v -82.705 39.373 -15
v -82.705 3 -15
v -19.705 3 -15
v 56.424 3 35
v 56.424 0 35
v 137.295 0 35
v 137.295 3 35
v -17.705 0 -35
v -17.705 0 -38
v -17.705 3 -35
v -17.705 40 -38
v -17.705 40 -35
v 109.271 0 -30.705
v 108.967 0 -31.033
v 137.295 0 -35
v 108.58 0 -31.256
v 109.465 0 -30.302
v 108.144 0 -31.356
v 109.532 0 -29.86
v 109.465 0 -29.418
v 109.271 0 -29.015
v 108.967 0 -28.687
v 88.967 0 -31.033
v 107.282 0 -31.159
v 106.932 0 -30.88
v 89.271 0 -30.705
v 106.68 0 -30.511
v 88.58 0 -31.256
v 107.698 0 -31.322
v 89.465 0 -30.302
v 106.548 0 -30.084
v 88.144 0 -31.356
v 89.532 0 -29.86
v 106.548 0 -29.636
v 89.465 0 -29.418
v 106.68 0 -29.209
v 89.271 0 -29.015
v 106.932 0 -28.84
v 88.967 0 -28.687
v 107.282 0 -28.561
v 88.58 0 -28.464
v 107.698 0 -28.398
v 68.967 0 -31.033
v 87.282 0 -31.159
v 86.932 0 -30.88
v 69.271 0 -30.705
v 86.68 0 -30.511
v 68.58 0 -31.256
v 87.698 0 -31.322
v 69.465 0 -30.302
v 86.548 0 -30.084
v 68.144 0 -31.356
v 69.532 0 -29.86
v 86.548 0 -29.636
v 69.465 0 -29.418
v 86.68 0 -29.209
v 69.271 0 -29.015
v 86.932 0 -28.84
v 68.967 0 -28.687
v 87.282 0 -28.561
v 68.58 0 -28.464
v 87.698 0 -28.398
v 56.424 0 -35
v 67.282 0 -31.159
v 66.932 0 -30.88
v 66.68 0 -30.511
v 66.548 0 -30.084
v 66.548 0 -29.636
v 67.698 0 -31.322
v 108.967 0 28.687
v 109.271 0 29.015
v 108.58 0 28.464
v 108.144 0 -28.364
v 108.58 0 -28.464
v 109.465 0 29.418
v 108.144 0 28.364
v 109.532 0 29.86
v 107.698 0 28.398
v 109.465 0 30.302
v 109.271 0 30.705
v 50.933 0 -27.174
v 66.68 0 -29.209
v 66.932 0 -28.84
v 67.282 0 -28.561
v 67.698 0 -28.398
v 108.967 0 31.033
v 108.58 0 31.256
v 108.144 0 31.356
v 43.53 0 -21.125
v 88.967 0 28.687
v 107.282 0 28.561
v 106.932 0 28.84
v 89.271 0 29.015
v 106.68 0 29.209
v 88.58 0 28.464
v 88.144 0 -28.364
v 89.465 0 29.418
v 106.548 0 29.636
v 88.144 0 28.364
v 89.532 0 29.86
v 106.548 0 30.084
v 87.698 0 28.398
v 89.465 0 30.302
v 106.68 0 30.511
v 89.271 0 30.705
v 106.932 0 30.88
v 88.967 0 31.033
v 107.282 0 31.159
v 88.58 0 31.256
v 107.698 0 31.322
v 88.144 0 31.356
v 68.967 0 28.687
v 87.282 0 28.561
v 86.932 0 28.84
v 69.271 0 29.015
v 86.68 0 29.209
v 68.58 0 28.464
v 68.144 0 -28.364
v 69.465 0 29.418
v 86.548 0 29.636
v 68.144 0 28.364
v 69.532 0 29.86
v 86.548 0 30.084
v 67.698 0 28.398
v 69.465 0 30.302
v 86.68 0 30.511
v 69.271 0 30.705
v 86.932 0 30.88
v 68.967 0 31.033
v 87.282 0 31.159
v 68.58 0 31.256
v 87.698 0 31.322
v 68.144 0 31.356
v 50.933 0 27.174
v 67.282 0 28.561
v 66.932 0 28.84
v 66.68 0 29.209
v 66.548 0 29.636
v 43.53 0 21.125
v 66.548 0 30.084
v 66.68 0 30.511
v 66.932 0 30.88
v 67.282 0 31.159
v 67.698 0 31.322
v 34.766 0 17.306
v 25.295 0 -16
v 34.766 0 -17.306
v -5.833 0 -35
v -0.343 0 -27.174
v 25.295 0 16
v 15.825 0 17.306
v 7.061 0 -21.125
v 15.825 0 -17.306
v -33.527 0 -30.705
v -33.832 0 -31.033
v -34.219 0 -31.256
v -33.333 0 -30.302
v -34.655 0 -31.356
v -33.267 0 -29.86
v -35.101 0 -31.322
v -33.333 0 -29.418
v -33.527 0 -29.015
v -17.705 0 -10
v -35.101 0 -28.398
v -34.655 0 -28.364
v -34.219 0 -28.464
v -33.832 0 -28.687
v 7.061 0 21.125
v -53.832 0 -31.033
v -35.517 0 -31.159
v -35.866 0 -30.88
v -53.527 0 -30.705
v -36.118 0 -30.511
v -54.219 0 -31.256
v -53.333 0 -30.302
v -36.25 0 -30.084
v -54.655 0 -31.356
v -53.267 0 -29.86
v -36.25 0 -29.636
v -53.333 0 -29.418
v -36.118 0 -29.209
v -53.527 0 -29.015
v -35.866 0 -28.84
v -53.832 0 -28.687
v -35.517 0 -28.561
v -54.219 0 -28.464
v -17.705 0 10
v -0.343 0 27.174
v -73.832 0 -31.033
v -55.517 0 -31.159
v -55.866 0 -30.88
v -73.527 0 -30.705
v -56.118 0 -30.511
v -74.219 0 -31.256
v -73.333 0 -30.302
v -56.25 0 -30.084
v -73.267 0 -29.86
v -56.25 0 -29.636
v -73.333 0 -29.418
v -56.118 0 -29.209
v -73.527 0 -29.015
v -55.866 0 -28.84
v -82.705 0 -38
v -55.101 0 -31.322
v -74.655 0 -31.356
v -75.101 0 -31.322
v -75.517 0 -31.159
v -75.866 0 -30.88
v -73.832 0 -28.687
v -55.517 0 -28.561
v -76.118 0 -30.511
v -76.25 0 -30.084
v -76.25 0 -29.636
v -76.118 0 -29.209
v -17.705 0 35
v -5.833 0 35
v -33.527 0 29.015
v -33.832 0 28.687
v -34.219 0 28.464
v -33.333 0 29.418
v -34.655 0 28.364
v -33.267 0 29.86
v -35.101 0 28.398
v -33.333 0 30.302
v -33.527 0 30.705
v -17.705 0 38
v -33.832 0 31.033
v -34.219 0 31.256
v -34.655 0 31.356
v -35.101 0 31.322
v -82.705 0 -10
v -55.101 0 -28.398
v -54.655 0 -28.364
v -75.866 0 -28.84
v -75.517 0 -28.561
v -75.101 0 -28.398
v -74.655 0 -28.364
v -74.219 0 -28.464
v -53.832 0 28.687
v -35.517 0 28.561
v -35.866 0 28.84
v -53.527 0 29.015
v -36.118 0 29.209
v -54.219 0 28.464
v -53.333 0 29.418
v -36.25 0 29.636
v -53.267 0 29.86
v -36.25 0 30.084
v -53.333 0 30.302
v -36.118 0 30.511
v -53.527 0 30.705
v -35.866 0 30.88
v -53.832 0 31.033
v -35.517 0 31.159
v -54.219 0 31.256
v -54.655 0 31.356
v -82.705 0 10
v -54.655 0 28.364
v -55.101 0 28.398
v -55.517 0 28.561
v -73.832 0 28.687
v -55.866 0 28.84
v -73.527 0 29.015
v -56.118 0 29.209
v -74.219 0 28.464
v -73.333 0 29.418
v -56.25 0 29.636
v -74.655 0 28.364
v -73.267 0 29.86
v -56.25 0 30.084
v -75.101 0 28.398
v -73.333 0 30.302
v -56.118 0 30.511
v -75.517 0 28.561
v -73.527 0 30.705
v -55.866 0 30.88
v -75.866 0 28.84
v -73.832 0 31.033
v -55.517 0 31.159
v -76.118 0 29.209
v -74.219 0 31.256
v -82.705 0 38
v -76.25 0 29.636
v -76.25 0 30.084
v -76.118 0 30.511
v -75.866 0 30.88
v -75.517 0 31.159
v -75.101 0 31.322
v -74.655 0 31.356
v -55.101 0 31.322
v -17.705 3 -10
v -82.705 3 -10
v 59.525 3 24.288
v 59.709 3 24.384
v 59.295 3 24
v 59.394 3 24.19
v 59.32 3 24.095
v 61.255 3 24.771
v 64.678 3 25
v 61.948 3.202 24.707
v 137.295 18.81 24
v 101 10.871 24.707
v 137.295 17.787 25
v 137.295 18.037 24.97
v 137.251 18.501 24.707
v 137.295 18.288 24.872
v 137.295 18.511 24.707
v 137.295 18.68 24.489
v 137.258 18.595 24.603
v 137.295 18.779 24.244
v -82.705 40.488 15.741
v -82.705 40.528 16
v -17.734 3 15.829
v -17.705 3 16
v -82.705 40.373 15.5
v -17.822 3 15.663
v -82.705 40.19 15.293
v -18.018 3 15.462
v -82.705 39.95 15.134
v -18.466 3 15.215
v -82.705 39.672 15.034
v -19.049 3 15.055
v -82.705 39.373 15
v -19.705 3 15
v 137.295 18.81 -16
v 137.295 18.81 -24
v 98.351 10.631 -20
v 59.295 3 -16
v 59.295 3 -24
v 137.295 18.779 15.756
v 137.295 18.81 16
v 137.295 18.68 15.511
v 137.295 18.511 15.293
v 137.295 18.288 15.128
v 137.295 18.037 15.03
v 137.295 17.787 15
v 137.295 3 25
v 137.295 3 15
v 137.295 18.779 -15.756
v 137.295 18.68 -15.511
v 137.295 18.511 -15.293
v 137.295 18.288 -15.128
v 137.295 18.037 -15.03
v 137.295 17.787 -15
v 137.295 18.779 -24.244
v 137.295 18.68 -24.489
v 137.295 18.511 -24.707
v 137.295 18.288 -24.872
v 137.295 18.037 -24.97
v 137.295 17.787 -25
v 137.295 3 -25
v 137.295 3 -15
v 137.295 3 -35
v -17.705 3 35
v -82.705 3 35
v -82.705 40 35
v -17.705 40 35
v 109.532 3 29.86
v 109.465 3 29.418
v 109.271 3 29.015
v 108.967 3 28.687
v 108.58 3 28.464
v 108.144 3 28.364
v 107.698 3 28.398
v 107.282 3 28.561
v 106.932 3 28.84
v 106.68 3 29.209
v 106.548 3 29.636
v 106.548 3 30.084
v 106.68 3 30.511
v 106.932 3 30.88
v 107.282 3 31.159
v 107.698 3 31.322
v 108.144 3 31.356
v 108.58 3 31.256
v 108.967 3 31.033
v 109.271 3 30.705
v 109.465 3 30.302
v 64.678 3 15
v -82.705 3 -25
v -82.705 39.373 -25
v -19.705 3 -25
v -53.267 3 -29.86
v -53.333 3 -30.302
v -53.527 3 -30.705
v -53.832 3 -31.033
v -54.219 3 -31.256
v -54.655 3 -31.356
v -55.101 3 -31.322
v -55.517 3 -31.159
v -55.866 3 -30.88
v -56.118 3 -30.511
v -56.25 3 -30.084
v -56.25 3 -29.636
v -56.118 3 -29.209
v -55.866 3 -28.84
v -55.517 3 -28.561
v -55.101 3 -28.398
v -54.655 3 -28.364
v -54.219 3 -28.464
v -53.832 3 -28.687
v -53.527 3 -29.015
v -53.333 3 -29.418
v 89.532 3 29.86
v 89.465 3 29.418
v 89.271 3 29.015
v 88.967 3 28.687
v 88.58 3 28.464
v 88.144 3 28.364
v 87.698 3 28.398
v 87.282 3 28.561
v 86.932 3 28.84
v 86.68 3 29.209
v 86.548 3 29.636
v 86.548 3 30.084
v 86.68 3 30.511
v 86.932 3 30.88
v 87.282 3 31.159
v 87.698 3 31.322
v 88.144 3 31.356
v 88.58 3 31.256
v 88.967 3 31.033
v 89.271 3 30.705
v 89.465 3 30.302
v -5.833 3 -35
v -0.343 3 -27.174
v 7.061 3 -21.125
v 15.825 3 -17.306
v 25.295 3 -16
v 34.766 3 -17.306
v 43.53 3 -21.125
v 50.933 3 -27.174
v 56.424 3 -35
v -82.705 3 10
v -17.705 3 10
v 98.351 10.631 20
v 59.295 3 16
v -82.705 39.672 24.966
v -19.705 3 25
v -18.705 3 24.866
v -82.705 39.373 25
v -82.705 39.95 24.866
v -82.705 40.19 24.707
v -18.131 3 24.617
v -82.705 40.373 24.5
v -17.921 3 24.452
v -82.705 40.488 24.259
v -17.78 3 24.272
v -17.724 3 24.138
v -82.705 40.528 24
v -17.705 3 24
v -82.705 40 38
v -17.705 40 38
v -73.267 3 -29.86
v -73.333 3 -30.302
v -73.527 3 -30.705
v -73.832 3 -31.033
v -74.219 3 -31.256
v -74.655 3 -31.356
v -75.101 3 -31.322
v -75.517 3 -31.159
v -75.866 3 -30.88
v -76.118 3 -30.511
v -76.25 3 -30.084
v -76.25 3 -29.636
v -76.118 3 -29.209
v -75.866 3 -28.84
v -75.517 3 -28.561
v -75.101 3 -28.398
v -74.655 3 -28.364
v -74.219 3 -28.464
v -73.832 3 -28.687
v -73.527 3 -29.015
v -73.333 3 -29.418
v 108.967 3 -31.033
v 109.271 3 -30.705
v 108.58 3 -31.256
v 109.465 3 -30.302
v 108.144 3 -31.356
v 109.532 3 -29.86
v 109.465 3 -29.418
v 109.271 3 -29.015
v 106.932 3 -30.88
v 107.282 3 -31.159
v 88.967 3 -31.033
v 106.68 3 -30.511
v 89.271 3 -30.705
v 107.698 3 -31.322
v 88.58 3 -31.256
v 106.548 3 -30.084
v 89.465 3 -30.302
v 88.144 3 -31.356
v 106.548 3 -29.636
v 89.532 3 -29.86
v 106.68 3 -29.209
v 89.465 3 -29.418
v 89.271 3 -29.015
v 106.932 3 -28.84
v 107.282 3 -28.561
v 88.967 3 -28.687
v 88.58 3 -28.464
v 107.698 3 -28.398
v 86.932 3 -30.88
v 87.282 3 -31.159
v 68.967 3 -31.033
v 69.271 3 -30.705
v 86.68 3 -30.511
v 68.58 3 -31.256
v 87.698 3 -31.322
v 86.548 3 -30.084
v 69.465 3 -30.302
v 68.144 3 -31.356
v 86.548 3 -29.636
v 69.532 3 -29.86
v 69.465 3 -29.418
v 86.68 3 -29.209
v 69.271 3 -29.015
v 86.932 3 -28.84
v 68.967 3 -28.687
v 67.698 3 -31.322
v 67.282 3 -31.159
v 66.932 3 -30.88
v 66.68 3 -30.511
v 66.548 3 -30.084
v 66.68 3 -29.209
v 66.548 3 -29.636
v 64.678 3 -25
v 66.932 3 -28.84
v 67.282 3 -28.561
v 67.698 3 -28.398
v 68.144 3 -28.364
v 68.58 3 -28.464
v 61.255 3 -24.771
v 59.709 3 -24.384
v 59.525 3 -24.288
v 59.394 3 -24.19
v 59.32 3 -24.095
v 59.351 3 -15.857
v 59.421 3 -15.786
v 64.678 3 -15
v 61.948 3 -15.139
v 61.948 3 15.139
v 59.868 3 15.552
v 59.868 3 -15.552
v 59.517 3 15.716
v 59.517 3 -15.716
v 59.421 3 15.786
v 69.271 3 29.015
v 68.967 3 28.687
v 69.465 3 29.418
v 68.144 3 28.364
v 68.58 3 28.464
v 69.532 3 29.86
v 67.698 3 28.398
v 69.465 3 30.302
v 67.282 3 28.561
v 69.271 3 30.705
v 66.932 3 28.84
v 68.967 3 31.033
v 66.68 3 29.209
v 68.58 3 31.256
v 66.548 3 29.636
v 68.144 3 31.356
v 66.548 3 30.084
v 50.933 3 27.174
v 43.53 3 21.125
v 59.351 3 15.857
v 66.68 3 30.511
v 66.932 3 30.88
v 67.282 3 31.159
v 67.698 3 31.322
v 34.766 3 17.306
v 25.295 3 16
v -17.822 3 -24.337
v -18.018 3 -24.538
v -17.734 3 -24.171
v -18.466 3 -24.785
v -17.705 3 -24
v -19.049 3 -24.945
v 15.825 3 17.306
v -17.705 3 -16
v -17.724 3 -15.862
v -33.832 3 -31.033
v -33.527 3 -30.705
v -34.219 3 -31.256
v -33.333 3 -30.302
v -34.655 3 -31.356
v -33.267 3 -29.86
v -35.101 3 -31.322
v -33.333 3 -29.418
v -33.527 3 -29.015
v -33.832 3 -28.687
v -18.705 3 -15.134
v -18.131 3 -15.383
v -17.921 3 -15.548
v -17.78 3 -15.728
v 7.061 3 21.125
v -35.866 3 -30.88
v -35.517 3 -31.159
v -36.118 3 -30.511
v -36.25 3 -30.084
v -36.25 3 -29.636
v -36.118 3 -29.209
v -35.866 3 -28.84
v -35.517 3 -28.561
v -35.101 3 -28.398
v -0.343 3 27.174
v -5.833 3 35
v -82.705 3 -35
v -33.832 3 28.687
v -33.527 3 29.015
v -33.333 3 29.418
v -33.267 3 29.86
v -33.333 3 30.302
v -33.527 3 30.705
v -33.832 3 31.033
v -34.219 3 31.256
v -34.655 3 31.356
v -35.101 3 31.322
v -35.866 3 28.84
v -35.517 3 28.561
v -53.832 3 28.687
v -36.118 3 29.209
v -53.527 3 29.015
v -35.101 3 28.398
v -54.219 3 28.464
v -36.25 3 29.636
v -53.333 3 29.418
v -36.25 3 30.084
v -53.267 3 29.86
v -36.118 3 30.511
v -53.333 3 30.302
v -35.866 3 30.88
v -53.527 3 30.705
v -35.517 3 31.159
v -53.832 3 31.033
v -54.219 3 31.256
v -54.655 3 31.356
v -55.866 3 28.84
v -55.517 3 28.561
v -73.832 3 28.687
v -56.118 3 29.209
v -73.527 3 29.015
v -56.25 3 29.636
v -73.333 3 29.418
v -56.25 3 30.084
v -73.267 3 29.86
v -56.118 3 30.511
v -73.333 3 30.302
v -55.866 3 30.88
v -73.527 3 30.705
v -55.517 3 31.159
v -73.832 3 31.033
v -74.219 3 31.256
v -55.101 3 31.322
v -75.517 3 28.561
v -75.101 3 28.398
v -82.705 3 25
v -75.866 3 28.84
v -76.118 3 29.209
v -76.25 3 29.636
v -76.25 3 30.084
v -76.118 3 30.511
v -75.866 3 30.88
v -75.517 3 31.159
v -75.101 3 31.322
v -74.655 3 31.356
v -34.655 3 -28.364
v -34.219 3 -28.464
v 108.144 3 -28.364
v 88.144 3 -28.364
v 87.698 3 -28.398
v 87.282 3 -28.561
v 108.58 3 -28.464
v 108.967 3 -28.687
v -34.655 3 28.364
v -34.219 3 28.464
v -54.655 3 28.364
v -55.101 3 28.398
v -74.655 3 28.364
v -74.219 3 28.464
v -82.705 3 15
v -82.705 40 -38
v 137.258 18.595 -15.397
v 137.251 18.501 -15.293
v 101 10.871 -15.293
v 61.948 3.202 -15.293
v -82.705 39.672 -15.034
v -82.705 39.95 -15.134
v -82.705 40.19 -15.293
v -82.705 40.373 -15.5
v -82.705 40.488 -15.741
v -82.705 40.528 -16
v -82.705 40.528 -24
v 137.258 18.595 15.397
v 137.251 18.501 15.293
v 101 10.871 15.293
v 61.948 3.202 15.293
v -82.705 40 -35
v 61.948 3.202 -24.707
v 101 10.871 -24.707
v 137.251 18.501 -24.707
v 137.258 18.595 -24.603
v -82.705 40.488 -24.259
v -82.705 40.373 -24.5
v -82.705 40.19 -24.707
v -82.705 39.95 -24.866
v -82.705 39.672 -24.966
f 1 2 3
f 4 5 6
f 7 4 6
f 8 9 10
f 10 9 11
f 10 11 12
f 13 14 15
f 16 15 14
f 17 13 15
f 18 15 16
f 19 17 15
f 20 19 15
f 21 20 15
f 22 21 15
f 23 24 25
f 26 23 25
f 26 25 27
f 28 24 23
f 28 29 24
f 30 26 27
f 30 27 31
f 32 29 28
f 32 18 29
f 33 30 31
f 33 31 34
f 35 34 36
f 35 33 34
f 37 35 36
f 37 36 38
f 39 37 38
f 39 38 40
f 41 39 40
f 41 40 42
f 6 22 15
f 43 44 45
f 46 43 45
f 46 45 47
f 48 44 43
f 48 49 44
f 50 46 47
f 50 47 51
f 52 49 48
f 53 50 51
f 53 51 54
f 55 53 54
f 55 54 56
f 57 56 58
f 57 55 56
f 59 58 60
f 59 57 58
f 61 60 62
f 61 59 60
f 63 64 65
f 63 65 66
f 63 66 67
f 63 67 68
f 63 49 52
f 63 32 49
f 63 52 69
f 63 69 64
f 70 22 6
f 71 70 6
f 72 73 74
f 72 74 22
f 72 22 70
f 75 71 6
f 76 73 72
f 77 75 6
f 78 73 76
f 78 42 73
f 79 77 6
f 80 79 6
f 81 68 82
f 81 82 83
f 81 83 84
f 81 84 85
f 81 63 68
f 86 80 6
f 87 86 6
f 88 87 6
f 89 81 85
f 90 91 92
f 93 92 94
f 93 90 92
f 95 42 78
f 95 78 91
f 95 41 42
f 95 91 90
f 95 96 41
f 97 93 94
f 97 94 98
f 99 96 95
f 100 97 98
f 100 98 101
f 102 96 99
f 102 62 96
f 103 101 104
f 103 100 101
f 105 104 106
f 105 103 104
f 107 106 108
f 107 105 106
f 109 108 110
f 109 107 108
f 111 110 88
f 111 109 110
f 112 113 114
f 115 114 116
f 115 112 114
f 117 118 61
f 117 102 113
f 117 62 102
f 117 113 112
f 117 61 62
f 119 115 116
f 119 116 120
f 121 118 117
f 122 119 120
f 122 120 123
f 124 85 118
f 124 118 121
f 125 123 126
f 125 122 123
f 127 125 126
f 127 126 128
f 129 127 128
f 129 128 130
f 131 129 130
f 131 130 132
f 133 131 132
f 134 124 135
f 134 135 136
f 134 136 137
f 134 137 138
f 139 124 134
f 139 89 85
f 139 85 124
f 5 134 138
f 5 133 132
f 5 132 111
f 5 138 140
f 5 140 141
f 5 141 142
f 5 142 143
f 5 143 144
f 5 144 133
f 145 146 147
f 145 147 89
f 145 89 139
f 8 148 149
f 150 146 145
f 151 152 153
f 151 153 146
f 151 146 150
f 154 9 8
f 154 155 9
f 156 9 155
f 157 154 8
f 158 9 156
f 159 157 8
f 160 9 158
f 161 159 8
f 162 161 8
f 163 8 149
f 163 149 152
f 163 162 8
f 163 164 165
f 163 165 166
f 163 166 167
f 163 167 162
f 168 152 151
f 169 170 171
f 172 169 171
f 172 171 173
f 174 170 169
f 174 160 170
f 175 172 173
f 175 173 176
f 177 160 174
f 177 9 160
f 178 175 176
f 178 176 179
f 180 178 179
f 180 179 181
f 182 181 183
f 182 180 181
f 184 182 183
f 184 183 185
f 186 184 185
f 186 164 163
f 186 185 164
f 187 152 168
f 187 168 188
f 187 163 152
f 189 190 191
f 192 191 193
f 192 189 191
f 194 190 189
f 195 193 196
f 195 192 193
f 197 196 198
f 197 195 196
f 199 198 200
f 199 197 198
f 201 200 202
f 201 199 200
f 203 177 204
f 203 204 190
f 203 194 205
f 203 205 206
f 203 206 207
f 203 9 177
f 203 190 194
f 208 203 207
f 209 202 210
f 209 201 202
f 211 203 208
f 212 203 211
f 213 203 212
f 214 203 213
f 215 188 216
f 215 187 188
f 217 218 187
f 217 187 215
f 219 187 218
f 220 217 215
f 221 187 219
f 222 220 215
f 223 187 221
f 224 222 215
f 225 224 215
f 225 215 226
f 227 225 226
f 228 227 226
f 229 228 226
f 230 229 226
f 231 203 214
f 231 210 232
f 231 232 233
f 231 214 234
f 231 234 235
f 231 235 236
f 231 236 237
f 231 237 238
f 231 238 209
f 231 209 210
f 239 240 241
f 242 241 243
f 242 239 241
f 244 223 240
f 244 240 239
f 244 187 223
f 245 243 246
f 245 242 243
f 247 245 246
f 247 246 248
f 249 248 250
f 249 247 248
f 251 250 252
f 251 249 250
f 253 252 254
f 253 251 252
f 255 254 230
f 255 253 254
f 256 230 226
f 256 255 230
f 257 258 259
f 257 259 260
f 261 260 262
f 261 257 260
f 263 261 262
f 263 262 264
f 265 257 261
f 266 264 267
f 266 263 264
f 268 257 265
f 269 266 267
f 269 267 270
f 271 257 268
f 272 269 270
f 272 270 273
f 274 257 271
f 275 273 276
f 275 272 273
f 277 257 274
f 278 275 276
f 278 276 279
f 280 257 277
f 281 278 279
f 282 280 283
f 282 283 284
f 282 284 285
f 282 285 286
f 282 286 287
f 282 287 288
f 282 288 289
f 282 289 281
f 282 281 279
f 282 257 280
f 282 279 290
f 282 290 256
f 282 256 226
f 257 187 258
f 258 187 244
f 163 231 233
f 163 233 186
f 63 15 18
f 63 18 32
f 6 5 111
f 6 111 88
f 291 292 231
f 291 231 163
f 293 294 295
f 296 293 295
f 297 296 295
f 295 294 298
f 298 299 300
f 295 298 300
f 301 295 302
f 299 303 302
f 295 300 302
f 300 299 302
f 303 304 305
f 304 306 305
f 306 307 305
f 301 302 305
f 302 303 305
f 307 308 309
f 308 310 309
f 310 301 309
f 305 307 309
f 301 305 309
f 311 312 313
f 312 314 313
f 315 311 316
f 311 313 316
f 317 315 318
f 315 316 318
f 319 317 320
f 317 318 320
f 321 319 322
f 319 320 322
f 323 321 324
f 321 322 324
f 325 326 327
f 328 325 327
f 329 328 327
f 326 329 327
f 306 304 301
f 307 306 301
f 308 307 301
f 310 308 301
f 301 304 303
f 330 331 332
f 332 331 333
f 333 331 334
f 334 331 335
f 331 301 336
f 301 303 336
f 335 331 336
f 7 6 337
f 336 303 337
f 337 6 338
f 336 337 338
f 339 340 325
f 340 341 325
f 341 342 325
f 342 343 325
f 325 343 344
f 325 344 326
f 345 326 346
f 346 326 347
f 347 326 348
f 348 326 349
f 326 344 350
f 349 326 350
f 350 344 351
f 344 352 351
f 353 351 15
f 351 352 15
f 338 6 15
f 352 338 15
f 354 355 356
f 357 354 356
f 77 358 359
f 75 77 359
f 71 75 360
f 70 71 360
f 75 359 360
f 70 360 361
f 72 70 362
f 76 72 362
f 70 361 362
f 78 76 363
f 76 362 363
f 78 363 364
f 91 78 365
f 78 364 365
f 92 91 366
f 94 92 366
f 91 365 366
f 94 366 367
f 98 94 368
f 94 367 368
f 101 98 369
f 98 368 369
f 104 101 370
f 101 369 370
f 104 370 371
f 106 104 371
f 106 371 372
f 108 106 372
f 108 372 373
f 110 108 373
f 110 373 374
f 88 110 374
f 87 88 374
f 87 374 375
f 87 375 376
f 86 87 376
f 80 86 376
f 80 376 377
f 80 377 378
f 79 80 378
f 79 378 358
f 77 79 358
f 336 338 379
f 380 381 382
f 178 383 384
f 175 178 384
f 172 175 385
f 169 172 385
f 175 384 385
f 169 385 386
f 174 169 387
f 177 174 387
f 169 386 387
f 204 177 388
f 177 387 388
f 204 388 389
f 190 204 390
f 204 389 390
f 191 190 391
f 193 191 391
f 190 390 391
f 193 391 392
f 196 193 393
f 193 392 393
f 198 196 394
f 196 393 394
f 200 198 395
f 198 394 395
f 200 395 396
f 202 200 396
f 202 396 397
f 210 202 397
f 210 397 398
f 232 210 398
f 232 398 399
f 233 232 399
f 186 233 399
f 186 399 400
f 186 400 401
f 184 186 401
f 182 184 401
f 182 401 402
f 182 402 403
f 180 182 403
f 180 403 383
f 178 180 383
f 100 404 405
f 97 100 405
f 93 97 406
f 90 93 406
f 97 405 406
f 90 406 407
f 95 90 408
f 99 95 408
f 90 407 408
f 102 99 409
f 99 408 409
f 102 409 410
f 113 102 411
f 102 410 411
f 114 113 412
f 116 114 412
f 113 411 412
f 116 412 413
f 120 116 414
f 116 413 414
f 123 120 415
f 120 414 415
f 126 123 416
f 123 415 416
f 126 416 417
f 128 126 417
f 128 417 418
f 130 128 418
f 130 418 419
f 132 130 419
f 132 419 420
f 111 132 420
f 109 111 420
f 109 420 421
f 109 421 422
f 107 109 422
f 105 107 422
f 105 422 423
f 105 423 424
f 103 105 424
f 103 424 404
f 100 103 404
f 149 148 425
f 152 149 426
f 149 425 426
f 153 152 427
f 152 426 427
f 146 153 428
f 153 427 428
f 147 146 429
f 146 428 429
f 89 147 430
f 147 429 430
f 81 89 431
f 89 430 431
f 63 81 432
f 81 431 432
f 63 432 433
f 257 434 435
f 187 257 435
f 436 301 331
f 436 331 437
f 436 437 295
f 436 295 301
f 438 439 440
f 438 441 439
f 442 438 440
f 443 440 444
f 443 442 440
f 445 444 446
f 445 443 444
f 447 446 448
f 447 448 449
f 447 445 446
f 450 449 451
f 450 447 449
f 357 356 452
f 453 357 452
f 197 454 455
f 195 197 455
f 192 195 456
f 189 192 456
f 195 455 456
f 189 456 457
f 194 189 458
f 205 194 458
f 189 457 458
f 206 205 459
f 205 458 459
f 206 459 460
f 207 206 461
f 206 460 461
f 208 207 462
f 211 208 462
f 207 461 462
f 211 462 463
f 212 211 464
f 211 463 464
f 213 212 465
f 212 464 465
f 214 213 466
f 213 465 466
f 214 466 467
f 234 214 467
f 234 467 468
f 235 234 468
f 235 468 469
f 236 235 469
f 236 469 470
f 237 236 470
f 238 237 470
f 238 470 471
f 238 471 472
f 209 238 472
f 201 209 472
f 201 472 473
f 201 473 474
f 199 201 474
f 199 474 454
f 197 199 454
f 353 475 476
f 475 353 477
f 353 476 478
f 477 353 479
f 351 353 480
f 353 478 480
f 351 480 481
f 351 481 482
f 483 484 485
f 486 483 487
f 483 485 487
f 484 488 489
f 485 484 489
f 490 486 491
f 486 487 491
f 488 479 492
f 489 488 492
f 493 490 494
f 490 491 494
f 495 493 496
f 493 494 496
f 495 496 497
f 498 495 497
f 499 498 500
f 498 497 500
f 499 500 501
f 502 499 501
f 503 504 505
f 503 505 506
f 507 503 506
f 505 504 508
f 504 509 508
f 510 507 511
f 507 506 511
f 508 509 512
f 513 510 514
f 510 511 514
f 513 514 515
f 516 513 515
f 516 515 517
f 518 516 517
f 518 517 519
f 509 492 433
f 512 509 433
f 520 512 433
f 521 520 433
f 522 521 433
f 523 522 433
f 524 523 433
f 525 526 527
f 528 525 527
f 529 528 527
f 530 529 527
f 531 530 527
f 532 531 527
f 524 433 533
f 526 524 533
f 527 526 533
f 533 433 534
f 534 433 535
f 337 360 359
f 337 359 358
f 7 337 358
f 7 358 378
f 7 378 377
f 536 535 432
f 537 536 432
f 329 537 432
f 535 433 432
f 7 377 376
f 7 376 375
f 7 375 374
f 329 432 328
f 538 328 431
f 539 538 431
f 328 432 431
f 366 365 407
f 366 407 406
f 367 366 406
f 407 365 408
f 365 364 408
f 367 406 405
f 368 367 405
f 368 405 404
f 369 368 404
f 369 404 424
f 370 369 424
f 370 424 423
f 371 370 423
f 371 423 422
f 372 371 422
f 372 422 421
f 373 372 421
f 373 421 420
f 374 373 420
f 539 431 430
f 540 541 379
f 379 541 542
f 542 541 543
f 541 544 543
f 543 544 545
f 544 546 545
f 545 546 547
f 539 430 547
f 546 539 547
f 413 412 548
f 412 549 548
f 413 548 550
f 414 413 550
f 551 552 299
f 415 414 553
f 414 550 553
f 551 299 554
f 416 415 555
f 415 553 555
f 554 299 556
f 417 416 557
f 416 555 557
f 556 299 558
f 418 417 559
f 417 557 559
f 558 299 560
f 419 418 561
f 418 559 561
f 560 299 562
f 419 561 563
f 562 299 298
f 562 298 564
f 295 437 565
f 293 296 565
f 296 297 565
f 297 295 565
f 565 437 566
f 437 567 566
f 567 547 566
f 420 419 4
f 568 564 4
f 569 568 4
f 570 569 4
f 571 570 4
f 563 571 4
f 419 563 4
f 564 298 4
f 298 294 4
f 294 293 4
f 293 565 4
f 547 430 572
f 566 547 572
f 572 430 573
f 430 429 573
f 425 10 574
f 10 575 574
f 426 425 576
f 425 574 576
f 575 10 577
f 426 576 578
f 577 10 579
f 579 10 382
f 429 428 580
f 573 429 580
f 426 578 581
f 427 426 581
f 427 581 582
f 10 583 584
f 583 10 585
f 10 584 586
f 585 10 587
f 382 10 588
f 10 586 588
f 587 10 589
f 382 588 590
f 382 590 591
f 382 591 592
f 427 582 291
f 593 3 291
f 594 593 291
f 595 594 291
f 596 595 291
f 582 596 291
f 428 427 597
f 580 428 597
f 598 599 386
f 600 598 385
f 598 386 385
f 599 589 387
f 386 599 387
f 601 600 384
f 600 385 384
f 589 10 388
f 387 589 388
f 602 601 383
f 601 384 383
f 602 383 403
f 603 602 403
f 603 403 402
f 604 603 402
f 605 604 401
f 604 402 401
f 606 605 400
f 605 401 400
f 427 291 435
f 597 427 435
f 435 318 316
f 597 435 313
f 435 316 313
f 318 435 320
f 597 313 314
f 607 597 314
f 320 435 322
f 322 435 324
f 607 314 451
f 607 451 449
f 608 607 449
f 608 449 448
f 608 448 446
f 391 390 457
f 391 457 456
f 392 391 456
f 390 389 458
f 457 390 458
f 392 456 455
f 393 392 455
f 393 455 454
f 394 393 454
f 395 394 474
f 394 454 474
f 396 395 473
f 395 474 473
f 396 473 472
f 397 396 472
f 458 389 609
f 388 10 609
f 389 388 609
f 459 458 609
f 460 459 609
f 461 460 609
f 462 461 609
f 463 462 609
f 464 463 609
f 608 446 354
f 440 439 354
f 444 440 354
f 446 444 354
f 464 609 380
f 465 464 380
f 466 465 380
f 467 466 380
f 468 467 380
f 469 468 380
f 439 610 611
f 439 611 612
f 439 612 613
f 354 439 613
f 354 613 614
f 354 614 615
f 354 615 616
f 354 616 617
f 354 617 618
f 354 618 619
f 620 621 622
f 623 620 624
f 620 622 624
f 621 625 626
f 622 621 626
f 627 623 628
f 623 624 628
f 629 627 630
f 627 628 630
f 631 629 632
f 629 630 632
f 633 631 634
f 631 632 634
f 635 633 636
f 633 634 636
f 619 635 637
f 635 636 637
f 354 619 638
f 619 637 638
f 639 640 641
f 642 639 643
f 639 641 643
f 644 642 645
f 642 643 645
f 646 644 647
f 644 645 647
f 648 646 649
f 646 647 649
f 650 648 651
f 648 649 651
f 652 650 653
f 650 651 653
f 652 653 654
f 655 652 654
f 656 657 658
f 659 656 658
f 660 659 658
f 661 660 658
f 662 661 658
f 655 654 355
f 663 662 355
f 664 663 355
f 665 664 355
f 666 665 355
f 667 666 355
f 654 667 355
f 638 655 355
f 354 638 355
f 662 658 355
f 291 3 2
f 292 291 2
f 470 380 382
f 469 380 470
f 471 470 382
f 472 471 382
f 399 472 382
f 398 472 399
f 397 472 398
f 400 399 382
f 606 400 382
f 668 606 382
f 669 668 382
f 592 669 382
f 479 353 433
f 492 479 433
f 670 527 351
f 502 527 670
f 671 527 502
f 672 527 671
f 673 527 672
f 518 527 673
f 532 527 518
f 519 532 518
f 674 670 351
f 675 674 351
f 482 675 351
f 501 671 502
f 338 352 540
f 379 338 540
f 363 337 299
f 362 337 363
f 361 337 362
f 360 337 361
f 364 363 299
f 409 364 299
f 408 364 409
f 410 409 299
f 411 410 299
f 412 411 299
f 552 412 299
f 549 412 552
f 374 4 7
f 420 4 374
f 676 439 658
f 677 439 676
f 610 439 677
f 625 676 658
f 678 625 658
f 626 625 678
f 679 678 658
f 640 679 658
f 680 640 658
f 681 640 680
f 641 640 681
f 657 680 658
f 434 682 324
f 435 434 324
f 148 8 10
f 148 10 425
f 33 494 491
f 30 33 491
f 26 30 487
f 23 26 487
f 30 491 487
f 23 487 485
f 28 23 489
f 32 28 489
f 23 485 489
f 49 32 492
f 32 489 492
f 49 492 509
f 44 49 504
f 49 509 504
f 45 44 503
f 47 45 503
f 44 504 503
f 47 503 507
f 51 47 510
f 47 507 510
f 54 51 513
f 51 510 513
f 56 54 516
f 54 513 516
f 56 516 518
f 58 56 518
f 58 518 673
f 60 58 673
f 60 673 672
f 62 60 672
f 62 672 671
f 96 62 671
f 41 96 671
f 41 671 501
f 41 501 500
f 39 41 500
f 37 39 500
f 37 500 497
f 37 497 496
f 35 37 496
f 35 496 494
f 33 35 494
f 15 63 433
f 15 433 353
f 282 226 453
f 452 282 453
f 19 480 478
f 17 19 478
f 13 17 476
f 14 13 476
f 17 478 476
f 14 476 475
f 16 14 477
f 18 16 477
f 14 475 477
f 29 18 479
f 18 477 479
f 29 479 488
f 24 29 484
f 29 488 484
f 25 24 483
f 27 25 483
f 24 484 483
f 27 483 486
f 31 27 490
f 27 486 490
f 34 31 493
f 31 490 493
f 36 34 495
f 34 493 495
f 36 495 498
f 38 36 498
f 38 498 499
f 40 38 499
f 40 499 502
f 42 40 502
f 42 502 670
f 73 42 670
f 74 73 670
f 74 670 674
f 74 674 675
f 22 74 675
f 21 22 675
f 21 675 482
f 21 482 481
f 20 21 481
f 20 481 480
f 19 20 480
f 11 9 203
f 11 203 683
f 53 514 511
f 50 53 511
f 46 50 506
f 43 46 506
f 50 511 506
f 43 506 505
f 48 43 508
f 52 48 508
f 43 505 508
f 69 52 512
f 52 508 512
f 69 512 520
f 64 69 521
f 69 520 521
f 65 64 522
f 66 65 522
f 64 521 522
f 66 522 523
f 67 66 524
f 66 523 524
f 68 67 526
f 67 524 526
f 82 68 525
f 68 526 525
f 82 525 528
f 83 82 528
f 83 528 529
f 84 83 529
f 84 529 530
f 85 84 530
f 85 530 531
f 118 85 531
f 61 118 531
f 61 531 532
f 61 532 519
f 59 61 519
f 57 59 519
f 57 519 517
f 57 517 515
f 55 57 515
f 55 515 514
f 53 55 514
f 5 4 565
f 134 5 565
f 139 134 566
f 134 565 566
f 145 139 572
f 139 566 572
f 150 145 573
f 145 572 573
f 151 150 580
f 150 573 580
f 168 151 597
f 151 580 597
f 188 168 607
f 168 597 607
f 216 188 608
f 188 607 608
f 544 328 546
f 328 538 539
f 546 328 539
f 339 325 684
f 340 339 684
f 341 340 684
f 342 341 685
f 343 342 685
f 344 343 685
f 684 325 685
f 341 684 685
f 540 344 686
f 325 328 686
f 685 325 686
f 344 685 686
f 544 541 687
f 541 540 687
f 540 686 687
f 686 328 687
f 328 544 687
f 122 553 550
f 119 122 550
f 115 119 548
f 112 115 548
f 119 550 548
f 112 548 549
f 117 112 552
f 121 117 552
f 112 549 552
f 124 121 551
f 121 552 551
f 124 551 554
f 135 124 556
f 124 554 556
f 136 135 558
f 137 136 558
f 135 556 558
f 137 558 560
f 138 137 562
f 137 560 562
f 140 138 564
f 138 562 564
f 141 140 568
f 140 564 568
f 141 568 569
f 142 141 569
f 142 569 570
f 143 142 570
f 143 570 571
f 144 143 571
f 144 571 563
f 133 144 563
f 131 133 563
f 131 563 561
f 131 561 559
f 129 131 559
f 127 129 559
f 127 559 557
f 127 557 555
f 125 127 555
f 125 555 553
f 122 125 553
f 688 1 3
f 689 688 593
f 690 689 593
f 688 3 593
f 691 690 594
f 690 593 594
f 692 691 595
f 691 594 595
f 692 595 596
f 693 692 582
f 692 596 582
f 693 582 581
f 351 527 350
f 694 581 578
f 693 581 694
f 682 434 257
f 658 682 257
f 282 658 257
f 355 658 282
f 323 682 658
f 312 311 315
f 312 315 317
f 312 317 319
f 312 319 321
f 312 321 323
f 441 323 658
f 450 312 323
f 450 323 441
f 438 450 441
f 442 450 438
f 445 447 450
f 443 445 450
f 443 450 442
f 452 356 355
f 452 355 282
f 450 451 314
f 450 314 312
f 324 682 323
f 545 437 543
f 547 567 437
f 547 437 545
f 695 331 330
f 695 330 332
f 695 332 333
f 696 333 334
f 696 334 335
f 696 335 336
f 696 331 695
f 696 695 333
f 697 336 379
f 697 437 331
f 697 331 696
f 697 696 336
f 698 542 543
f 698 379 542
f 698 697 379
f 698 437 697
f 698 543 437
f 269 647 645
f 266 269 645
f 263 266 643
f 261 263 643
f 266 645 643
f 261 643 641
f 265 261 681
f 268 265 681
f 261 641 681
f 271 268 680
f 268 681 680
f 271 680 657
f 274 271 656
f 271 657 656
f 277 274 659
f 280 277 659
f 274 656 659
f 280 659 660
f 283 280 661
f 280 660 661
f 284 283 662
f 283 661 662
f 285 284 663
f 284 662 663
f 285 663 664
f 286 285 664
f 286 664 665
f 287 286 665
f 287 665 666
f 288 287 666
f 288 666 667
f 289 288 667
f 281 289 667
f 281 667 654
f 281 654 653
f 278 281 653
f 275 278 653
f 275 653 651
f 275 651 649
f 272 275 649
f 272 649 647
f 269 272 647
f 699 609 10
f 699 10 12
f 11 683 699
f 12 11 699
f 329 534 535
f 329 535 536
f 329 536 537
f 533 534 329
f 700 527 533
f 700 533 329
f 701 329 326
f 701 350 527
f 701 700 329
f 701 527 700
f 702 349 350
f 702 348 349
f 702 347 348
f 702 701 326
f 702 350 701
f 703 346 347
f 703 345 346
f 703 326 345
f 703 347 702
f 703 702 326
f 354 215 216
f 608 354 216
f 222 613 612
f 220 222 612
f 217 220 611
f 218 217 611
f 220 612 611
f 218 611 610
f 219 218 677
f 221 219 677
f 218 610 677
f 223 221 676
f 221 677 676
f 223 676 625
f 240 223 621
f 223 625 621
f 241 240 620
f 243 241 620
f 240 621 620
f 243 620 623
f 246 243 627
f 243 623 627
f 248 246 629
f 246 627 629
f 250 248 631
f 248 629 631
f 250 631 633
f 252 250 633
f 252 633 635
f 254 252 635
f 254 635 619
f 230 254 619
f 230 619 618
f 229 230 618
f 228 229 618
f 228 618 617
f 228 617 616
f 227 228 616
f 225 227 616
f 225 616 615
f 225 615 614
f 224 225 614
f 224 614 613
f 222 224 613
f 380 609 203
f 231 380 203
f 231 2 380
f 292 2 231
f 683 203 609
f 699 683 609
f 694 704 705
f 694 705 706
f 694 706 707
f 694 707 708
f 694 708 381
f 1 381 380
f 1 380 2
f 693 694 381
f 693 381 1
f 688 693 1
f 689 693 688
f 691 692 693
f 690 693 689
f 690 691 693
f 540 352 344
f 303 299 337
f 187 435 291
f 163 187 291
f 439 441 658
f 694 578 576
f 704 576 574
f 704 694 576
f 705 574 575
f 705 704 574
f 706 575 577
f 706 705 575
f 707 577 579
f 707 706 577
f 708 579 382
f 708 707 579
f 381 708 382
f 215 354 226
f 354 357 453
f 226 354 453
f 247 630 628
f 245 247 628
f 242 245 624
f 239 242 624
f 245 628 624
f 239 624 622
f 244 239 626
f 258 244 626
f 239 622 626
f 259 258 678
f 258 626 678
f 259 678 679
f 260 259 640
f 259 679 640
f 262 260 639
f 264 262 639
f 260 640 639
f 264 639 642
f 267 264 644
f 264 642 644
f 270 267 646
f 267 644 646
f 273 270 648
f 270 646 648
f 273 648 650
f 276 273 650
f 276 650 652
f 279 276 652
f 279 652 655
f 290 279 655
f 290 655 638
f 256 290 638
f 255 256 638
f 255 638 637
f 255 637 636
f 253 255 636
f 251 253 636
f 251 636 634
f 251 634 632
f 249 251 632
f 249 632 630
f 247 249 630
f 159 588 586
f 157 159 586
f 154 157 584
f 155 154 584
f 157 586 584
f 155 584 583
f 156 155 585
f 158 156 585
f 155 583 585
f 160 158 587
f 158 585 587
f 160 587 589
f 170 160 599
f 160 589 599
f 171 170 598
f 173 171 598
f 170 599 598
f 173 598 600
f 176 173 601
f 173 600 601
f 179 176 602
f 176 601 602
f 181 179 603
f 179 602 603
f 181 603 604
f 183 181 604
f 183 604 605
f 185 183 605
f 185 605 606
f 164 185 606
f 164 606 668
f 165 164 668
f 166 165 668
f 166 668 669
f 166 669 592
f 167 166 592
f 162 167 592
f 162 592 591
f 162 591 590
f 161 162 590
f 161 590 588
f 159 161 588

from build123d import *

# Parameters (mm, degrees)
SKETCH_1_W           = 220
SKETCH_1_H           = 70
EXTRUDE_1_DEPTH      = 3
EXTRUDE_2_DEPTH      = 25
EXTRUDE_2_DEPTH_BACK = 25
SKETCH_6_W           = 30
SKETCH_6_H           = 37.527767497
CUT_EXTRUDE_4_DEPTH  = 221.0000001
SKETCH_7_R           = 35
CUT_EXTRUDE_5_DEPTH  = 4
SKETCH_8_W           = 3
SKETCH_8_H           = 40
EXTRUDE_3_DEPTH      = 65
SKETCH_9_R           = 1.5
CUT_EXTRUDE_6_DEPTH  = 4
FILLET_5_R           = 1
SKETCH_10_W          = 65
SKETCH_10_H          = 20
CUT_EXTRUDE_7_DEPTH  = 4.0000001


with BuildPart() as part:
    # 草图1 → 凸台-拉伸1 (new body)
    with BuildSketch(Plane(origin=(0, 0, 0), x_dir=(1, 0, 0), z_dir=(0, 1, 0))):
        with Locations((27.295373665, 0)):
            Rectangle(SKETCH_1_W, SKETCH_1_H)
    extrude(amount=EXTRUDE_1_DEPTH)

    # 草图2 → 凸台-拉伸2 (add, two sides)
    with BuildSketch(Plane.XY) as extrude_2_sk:
        Polygon((-82.704626335, 40.527767497), (-82.704626335, 3), (-17.704626335, 3), align=None)
        with BuildLine():
            Line((137.295373665, 3), (137.295373665, 18.810437945))
            add(Edge.make_bspline(
                [(59.295373665, 3), (98.406140267, 10.357107668), (137.295373665, 18.810437945)],
                knots=[0, 0, 0, 1, 1, 1], degree=2))
            Line((59.295373665, 3), (137.295373665, 3))
        make_face()
    extrude(amount=EXTRUDE_2_DEPTH)
    extrude(extrude_2_sk.sketch, amount=-EXTRUDE_2_DEPTH_BACK)

    # 草图6 → 切除-拉伸4 (cut, through all)
    with BuildSketch(Plane.ZY.offset(82.704626335)):
        with Locations((0, 21.763883748)):
            Rectangle(SKETCH_6_W, SKETCH_6_H)
    extrude(amount=-CUT_EXTRUDE_4_DEPTH, mode=Mode.SUBTRACT)

    # 草图7 → 切除-拉伸5 (cut, through all)
    with BuildSketch(Plane(origin=(0, 3, 0), x_dir=(1, 0, 0), z_dir=(0, 1, 0))):
        with Locations((25.295373665, 51)):
            Circle(SKETCH_7_R)
        with Locations((25.295373665, -51)):
            Circle(SKETCH_7_R)
    extrude(amount=-CUT_EXTRUDE_5_DEPTH, mode=Mode.SUBTRACT)

    # 草图8 → 凸台-拉伸3 (add)
    with BuildSketch(Plane.ZY.offset(82.704626335)):
        with Locations((36.5, 20)):
            Rectangle(SKETCH_8_W, SKETCH_8_H)
        with Locations((-36.5, 20)):
            Rectangle(SKETCH_8_W, SKETCH_8_H)
    extrude(amount=-EXTRUDE_3_DEPTH)

    # 草图9 → 切除-拉伸6 (cut, through all)
    with BuildSketch(Plane(origin=(0, 3, 0), x_dir=(1, 0, 0), z_dir=(0, 1, 0))):
        with Locations((-74.766784803, 29.860059225)):
            Circle(SKETCH_9_R)
        with Locations((-54.766784803, 29.860059225)):
            Circle(SKETCH_9_R)
        with Locations((-34.766784803, 29.860059225)):
            Circle(SKETCH_9_R)
        with Locations((-34.766784803, -29.860059225)):
            Circle(SKETCH_9_R)
        with Locations((-54.766784803, -29.860059225)):
            Circle(SKETCH_9_R)
        with Locations((-74.766784803, -29.860059225)):
            Circle(SKETCH_9_R)
        with Locations((68.031562246, 29.860059225)):
            Circle(SKETCH_9_R)
        with Locations((88.031562246, 29.860059225)):
            Circle(SKETCH_9_R)
        with Locations((108.031562246, 29.860059225)):
            Circle(SKETCH_9_R)
        with Locations((108.031562246, -29.860059225)):
            Circle(SKETCH_9_R)
        with Locations((88.031562246, -29.860059225)):
            Circle(SKETCH_9_R)
        with Locations((68.031562246, -29.860059225)):
            Circle(SKETCH_9_R)
    extrude(amount=-CUT_EXTRUDE_6_DEPTH, mode=Mode.SUBTRACT)

    # 圆角5
    fillet_5_edges = [part.edges().sort_by_distance(p)[0] for p in [
        (98.35091757, 10.631195874, -25),
        (98.35091757, 10.631195874, 25),
        (-50.204626335, 21.763883749, -25),
        (-50.204626335, 21.763883749, 25),
        (-50.204626335, 21.763883749, -15),
        (-50.204626335, 21.763883749, 15),
        (98.35091757, 10.631195874, 15),
        (98.35091757, 10.631195874, -15),
    ]]
    fillet(fillet_5_edges, radius=FILLET_5_R)

    # 草图10 → 切除-拉伸7 (cut, through all)
    with BuildSketch(Plane(origin=(0, 3, 0), x_dir=(1, 0, 0), z_dir=(0, 1, 0))):
        with Locations((-50.204626335, 0)):
            Rectangle(SKETCH_10_W, SKETCH_10_H)
    extrude(amount=-CUT_EXTRUDE_7_DEPTH, mode=Mode.SUBTRACT)


solid = part.part
